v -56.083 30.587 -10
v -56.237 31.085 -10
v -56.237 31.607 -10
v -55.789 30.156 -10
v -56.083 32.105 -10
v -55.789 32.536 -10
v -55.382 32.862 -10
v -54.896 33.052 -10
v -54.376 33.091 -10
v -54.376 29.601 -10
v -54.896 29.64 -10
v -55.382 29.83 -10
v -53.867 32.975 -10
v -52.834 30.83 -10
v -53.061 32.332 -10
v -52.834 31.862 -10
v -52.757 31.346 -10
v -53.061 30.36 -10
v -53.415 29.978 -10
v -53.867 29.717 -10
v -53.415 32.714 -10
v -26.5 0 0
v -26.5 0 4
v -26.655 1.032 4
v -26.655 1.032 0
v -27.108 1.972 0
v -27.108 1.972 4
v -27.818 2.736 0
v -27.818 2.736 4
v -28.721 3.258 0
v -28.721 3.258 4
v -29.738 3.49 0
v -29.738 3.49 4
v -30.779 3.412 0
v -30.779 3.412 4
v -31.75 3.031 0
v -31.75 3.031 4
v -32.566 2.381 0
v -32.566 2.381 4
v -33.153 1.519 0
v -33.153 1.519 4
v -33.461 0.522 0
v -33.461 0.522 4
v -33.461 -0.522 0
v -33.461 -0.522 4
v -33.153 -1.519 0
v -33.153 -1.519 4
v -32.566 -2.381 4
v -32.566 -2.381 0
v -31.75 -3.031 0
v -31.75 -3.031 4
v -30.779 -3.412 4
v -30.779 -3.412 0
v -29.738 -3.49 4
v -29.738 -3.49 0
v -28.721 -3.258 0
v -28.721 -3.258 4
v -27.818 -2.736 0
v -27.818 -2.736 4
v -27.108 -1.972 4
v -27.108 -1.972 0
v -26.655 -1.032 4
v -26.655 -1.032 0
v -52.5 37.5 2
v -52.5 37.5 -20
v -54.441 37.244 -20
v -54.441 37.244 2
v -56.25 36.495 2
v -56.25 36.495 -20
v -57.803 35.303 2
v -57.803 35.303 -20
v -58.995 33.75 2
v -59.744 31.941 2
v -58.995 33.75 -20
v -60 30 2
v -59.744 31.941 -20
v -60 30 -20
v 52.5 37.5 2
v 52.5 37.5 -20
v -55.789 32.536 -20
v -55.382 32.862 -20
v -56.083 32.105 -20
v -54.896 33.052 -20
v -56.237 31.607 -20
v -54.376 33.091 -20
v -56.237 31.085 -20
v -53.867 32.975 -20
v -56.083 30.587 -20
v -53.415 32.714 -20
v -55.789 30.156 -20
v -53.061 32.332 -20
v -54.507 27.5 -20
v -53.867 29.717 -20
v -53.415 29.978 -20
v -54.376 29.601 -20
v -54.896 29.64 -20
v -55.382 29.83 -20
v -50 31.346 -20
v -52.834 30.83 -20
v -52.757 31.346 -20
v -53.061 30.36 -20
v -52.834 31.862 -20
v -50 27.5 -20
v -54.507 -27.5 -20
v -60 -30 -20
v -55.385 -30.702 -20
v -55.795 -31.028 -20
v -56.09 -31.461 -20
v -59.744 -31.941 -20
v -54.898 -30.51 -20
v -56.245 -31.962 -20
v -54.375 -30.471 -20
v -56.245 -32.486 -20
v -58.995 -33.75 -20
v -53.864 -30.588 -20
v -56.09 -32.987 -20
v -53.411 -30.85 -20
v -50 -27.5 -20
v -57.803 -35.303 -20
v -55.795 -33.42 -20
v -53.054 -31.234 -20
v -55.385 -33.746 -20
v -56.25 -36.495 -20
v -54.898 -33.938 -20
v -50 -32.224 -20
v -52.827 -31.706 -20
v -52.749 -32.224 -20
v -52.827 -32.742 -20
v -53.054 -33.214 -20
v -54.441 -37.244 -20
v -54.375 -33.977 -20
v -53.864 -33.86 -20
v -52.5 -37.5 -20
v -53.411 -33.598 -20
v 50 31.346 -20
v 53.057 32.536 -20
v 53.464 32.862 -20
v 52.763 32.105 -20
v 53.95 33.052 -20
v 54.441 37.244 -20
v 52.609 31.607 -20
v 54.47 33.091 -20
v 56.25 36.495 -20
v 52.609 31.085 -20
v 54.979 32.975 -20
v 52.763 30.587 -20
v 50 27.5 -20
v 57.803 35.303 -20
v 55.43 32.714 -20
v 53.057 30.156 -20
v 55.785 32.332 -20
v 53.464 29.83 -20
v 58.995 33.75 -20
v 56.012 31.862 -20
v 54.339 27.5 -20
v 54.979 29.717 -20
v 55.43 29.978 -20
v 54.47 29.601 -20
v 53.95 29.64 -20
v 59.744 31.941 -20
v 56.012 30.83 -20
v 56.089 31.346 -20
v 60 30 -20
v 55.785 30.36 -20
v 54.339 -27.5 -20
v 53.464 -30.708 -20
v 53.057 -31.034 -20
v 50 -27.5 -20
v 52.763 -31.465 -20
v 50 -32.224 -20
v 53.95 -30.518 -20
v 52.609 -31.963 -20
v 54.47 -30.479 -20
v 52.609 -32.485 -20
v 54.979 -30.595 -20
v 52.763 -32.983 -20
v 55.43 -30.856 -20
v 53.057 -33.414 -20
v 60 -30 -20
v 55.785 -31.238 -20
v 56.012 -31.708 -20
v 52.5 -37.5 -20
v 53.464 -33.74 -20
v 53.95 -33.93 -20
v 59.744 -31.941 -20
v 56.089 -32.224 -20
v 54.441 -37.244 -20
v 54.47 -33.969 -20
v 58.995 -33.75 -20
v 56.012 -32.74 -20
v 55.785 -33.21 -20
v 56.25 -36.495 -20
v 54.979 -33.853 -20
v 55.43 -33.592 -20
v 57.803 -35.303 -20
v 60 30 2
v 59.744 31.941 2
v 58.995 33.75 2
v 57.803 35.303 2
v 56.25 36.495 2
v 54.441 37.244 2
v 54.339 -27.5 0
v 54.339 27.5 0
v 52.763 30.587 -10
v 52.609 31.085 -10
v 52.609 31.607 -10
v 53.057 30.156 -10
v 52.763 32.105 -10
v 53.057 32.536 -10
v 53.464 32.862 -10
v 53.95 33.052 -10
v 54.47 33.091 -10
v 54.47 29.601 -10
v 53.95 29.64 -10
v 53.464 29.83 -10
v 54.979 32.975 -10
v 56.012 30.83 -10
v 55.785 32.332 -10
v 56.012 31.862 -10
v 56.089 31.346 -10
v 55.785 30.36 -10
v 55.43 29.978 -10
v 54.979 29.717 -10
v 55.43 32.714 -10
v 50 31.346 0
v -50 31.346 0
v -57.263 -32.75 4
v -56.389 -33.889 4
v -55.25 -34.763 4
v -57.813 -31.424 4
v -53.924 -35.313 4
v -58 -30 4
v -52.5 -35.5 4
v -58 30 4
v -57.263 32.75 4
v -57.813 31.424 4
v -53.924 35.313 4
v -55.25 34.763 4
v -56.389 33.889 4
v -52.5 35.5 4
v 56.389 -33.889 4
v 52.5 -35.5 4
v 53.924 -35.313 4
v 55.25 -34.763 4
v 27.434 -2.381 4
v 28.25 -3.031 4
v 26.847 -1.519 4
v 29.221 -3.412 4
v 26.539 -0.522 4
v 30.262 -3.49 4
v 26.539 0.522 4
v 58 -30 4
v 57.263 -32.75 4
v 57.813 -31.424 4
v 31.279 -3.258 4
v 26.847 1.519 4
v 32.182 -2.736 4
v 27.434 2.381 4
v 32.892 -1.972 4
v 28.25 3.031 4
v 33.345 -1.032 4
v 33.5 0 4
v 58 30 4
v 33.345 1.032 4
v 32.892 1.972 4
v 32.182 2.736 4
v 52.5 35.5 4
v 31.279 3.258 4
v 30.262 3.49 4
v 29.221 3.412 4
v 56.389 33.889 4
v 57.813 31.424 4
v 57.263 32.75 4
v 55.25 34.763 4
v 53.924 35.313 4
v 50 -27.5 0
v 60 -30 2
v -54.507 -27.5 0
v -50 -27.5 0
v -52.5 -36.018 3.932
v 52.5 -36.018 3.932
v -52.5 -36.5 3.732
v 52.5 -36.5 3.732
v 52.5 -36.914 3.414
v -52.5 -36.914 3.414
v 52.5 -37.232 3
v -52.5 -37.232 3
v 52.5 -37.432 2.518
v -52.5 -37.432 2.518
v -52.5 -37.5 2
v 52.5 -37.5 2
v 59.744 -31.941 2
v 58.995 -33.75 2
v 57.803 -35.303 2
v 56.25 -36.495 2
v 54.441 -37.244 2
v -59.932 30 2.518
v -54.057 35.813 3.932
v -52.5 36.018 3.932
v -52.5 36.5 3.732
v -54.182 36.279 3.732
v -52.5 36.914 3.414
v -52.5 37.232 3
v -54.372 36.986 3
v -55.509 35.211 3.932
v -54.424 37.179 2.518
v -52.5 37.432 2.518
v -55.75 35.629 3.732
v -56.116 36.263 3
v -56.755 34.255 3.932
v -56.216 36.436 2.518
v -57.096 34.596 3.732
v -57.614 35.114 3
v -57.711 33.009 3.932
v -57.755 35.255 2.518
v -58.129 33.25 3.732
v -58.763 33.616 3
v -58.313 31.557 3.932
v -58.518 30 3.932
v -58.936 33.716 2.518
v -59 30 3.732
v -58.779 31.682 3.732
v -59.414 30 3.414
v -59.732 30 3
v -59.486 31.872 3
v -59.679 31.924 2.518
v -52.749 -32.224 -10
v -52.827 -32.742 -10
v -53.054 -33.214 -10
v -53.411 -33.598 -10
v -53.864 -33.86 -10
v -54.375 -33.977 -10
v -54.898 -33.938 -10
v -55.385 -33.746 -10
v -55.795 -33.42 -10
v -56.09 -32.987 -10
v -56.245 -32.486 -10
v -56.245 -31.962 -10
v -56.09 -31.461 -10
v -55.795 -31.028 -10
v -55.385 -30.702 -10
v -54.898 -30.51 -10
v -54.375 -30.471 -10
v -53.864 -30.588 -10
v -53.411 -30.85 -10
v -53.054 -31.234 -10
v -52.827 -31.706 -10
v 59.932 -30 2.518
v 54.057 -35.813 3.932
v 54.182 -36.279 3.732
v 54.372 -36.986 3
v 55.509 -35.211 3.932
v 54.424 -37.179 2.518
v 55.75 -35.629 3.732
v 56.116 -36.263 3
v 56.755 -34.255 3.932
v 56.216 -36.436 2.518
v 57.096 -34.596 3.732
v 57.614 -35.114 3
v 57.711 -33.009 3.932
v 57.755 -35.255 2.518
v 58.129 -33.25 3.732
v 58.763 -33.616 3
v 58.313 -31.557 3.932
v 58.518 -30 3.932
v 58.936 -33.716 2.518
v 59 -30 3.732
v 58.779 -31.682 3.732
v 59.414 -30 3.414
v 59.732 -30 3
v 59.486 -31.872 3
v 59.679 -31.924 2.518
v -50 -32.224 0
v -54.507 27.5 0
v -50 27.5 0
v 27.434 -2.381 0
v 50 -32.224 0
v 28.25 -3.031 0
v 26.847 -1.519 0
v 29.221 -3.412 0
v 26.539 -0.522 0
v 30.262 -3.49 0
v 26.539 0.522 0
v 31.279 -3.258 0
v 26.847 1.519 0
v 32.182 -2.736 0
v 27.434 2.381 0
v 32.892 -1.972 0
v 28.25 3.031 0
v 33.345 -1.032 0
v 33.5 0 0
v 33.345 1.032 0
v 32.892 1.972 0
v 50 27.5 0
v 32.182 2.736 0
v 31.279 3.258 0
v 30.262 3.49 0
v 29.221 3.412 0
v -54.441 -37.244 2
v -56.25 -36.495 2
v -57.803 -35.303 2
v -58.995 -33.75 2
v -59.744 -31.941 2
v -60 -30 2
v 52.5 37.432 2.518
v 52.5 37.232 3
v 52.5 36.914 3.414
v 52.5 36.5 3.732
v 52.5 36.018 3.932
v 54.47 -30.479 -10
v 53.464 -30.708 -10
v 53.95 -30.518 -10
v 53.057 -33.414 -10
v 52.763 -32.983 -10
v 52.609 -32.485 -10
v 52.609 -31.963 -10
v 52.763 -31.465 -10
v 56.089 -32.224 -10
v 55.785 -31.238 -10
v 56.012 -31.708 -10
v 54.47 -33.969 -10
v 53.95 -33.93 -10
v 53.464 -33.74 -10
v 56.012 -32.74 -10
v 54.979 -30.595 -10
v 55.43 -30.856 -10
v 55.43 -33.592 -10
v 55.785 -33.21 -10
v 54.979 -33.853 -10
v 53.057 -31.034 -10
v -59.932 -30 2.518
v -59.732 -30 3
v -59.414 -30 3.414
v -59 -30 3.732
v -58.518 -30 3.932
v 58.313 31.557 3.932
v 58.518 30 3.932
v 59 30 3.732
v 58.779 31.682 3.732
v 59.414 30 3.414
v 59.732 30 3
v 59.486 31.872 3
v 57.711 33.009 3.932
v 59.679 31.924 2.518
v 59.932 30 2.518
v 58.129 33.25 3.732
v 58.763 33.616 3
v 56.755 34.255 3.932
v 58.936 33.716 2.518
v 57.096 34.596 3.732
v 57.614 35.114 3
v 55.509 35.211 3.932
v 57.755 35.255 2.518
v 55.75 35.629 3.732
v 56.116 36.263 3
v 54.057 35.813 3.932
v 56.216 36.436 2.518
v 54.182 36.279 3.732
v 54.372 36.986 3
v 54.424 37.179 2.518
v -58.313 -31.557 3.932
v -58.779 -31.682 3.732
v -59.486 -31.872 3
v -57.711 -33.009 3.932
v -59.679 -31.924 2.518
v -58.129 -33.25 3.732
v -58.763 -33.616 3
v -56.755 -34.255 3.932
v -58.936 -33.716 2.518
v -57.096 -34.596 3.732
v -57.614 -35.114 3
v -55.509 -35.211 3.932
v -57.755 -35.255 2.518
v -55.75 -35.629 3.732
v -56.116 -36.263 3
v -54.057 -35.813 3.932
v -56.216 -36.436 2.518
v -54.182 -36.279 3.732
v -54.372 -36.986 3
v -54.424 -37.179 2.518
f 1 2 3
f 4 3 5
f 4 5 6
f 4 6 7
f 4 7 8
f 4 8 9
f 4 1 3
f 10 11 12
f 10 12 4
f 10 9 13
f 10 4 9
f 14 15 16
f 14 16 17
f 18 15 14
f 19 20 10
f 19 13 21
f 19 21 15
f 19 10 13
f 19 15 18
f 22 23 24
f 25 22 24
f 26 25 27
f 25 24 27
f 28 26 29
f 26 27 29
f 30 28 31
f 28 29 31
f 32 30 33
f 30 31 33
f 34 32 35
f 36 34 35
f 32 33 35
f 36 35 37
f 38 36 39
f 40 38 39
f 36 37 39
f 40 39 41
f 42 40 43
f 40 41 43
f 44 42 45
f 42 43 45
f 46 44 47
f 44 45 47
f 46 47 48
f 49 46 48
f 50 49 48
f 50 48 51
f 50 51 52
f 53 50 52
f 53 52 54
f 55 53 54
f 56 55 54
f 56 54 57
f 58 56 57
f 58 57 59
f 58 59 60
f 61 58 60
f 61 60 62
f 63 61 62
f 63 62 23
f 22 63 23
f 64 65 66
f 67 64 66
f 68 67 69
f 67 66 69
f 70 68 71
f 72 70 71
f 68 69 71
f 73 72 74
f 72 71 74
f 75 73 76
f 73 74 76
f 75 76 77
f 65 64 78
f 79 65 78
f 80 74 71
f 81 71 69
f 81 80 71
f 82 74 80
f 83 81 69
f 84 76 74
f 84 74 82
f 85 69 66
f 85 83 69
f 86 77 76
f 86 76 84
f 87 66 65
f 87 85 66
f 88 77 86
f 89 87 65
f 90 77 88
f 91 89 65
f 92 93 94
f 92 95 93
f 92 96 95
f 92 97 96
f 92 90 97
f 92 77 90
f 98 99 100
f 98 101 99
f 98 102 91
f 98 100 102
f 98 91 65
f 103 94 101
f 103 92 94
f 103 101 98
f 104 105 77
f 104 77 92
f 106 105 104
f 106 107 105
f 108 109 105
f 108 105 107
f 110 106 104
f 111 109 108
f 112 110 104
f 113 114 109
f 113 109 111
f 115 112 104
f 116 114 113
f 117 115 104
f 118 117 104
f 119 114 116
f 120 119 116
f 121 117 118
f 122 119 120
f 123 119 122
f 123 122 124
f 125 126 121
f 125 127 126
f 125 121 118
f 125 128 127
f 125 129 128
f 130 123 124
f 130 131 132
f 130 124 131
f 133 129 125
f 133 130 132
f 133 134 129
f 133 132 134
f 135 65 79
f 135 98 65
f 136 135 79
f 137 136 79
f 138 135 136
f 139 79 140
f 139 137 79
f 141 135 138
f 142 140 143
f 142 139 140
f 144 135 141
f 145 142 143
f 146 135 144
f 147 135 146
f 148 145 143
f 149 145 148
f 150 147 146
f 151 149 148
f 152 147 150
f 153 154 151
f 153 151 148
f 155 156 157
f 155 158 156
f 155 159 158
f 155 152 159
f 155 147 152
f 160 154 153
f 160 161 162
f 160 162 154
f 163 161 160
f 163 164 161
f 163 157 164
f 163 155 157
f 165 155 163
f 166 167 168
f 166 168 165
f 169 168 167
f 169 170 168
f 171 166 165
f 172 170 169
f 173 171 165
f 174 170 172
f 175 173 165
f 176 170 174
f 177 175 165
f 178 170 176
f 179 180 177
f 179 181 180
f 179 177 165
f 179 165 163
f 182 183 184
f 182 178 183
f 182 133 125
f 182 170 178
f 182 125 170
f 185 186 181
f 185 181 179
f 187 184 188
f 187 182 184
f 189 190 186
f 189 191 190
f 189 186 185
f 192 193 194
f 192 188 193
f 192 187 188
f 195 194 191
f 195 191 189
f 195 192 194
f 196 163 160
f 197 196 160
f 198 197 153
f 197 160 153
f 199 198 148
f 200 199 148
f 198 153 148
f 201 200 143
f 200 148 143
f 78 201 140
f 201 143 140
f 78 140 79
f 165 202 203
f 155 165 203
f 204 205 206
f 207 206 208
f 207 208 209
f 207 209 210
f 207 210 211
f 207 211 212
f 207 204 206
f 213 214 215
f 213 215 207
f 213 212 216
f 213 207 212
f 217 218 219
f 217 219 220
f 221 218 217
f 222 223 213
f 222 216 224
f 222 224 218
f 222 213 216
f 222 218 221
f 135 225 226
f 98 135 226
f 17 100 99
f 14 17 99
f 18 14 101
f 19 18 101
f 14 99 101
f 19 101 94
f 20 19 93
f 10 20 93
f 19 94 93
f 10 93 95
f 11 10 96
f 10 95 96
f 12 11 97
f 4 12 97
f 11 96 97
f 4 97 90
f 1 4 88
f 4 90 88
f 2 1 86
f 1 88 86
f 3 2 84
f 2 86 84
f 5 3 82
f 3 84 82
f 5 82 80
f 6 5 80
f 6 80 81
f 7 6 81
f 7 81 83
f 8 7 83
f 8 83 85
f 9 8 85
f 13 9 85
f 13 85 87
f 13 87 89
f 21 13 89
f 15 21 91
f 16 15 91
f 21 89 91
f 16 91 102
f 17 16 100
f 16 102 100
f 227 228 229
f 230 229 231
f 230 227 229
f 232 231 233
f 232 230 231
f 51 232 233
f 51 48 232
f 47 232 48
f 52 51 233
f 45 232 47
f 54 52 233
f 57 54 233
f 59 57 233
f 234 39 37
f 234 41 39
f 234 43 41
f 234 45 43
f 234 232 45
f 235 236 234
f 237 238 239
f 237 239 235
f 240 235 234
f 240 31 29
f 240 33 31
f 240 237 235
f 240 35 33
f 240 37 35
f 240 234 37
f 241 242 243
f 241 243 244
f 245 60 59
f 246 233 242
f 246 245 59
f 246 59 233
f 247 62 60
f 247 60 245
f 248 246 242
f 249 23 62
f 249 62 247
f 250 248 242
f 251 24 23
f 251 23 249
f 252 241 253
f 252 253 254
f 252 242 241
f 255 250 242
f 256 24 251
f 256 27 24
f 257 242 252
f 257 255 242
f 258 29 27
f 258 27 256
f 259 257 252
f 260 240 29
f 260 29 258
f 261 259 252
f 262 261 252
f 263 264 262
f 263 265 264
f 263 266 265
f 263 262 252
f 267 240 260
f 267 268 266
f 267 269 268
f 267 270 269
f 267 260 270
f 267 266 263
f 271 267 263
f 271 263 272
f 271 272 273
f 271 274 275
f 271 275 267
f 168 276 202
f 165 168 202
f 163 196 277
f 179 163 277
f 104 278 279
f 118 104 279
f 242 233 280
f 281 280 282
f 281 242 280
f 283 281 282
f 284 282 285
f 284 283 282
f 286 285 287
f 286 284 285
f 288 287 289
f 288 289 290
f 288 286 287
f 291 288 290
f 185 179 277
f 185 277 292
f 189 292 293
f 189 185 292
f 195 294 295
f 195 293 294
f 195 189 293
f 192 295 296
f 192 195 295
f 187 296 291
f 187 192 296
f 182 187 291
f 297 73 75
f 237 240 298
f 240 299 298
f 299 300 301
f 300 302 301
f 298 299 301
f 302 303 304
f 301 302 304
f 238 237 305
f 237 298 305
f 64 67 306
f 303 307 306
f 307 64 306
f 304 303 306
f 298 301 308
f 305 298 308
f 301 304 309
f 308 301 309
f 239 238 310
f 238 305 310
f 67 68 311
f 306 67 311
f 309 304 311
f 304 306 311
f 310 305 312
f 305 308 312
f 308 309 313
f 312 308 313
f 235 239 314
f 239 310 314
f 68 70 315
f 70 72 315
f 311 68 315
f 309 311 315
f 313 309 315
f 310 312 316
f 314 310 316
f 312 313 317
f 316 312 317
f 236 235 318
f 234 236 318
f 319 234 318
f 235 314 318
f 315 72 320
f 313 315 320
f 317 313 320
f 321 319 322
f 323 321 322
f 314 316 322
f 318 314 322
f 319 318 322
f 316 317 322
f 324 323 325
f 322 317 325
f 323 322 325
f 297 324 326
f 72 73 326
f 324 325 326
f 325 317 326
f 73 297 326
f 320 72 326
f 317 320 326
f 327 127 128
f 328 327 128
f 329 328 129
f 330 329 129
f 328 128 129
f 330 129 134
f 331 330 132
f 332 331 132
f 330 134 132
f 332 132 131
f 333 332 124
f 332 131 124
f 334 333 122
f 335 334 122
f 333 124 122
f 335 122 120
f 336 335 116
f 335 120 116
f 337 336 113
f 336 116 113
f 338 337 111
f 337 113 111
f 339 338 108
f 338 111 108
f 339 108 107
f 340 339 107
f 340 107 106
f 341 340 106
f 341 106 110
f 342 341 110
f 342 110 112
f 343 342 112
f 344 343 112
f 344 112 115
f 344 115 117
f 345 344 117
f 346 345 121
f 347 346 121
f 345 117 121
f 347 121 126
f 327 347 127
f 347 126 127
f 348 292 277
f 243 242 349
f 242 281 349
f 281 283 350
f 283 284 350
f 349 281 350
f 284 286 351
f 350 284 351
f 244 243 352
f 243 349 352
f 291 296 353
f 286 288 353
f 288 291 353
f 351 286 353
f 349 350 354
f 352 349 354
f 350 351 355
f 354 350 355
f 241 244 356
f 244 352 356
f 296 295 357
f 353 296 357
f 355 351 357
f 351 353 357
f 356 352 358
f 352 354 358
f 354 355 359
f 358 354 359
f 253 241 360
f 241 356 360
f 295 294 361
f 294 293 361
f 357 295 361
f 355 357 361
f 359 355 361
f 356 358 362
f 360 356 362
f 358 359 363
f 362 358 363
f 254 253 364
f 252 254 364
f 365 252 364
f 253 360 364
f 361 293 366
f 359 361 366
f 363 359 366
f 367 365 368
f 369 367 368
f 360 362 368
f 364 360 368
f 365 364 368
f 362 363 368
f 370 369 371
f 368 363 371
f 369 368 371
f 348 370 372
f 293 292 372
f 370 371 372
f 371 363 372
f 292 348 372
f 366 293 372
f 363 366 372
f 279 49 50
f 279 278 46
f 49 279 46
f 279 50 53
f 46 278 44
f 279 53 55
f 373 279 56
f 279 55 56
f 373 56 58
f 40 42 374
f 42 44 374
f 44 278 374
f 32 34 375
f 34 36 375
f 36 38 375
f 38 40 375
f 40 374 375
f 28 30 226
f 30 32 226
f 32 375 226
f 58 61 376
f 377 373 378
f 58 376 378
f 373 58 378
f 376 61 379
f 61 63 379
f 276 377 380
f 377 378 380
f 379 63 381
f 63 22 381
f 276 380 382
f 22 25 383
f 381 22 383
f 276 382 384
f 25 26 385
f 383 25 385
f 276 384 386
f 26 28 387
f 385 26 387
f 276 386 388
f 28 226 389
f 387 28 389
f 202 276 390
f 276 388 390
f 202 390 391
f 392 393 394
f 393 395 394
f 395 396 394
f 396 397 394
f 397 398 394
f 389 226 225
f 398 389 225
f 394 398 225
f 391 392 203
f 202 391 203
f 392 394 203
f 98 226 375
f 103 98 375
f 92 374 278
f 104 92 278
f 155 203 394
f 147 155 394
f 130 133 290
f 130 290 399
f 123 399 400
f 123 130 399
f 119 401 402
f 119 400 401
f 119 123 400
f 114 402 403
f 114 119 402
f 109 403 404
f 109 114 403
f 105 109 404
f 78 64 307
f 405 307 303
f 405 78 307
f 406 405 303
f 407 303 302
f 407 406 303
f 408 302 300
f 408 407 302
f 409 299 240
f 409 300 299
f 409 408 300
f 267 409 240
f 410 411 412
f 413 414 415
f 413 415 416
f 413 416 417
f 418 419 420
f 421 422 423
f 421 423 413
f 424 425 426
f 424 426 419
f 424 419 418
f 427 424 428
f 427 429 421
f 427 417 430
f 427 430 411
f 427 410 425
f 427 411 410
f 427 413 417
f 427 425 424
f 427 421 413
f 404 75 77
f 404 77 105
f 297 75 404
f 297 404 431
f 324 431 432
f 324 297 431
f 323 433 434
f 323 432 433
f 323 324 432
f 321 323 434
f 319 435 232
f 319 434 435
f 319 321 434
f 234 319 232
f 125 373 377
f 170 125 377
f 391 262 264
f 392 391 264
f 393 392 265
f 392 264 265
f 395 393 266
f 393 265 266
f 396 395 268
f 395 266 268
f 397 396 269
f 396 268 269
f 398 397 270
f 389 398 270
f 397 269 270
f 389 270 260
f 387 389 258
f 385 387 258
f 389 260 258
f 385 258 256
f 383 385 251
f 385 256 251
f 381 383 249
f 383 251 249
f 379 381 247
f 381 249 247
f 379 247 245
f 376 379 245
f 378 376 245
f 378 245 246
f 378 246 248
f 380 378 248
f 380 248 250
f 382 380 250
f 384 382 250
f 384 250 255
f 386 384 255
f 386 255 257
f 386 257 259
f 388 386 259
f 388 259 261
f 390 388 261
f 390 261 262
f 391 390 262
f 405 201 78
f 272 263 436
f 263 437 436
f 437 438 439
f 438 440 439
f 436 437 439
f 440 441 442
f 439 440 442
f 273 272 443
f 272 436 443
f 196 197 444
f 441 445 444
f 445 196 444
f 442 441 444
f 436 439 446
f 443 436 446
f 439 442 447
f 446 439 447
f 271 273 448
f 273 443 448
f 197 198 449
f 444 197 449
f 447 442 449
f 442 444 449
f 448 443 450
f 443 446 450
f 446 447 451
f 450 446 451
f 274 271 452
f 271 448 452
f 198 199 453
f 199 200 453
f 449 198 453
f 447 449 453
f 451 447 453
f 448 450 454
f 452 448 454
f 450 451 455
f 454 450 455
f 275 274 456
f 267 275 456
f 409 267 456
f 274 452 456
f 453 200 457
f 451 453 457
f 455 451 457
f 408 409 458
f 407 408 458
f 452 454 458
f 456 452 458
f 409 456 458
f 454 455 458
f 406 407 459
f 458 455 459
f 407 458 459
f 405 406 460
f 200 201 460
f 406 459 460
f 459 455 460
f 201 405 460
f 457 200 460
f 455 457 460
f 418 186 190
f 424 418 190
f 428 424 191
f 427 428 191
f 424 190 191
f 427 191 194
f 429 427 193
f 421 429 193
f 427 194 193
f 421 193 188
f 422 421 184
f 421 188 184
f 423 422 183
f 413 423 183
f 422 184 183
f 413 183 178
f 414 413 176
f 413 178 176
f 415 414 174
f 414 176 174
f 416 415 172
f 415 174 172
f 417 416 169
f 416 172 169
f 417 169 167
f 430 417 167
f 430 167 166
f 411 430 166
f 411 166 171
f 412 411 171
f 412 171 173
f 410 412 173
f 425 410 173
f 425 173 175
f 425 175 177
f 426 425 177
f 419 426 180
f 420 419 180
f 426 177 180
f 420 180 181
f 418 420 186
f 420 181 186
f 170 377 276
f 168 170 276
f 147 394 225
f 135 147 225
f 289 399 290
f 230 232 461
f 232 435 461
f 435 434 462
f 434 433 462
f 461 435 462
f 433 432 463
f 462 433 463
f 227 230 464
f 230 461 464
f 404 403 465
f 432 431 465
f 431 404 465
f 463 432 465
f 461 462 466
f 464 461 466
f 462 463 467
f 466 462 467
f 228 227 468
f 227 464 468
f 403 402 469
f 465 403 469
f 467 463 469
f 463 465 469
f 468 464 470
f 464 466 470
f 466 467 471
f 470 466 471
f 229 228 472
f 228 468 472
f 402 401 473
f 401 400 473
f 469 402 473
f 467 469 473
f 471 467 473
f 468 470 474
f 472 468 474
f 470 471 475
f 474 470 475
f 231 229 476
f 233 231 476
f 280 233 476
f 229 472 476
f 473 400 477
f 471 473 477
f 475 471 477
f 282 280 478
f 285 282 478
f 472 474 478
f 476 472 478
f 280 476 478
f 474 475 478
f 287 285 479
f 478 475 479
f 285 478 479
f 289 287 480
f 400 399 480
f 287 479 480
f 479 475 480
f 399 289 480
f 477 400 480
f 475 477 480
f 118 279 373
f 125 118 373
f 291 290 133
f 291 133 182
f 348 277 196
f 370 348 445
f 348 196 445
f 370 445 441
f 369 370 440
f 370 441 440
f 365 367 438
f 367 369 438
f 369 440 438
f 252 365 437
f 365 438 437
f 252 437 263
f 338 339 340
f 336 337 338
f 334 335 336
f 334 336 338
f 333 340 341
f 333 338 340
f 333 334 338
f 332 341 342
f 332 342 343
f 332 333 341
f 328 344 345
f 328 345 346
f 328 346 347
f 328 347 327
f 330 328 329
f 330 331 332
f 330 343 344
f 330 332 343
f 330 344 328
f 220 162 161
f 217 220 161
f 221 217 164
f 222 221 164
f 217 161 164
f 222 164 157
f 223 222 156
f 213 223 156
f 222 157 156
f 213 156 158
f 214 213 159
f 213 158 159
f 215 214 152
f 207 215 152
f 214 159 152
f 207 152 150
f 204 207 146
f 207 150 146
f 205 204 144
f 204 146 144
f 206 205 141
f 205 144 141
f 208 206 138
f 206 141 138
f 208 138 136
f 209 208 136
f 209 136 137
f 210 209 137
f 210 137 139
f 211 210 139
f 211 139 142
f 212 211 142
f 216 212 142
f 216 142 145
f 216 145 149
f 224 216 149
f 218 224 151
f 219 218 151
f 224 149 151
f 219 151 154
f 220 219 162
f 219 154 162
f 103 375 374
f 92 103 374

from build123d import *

# Parameters (mm, degrees)
F0_W         = 120
F0_H         = 75
F1_DEPTH     = 4
F2_W         = 120
F2_H         = 75
F3_DEPTH     = 20
F4_R         = 2
F5_T1_DEPTH  = 42.75
F5_T4_ANGLE  = 90
F5_T6_ANGLE  = 90
F5_T8_ANGLE  = 90
F5_T10_ANGLE = 90
F6_R         = 3.5
F7_DEPTH     = 25
F8_R         = 1.7577503979
F8_R_2       = 1.75
F9_DEPTH     = 10


# Not quite as in the source:
# - a fillet or chamfer that OpenCascade refuses, or shapes differently, is made with other operations: its cross-section is extruded or revolved along the edge and cut away or added


with BuildPart() as f1:
    # F0 (on Top) → F1 (new body)
    with BuildSketch(Plane.XY):
        Rectangle(F0_W, F0_H)
    extrude(amount=F1_DEPTH)

    # F2 (on face) → F3 (join)
    with BuildSketch(Plane(origin=(0, 0, 0), x_dir=(1, 0, 0), z_dir=(0, 0, -1))):
        Rectangle(F2_W, F2_H)
        Polygon((54.339364171, -27.5), (50, -27.5), (50, -31.3459709287), (-50, -31.3459709287), (-50, -27.5), (-54.5065030456, -27.5), (-54.5065030456, 27.5), (-50, 27.5), (-50, 32.2239883244), (50, 32.2239883244), (50, 27.5), (54.339364171, 27.5), align=None, mode=Mode.SUBTRACT)
    extrude(amount=F3_DEPTH)

    # F4
    f4_edges = [f1.edges().sort_by_distance(p)[0] for p in [
        (60, 0, 4),
        (0, -37.5, 4),
        (-60, 0, 4),
        (0, 37.5, 4),
    ]]
    fillet(f4_edges, radius=F4_R)

    # F5: fillet of radius 7.5 on 4 edges, made by hand

    # F5_s2 → F5_t1 (cut)
    with BuildSketch(Plane.XY.offset(-38.75)):
        with BuildLine():
            ThreePointArc((60, -30), (57.8033008589, -35.3033008589), (52.5, -37.5))
            Line((52.5, -37.5), (60, -37.5))
            Line((60, -37.5), (60, -30))
        make_face()
        with BuildLine():
            ThreePointArc((60, 30), (57.8033008589, 35.3033008589), (52.5, 37.5))
            Line((52.5, 37.5), (60, 37.5))
            Line((60, 37.5), (60, 30))
        make_face()
        with BuildLine():
            ThreePointArc((-52.5, -37.5), (-57.8033008589, -35.3033008589), (-60, -30))
            Line((-60, -30), (-60, -37.5))
            Line((-60, -37.5), (-52.5, -37.5))
        make_face()
        with BuildLine():
            ThreePointArc((-52.5, 37.5), (-57.8033008589, 35.3033008589), (-60, 30))
            Line((-60, 30), (-60, 37.5))
            Line((-60, 37.5), (-52.5, 37.5))
        make_face()
    extrude(amount=F5_T1_DEPTH, mode=Mode.SUBTRACT)

    # F5_s3 → F5_t4 (revolve, cut)
    with BuildSketch(Plane.YZ.offset(-52.5)):
        with BuildLine():
            ThreePointArc((35.5, 4), (36.9142135624, 3.4142135624), (37.5, 2))
            Line((37.5, 2), (37.5, 4))
            Line((37.5, 4), (35.5, 4))
        make_face()
    revolve(axis=Axis((-52.5, 30, 4), (0, 0, 1)), revolution_arc=F5_T4_ANGLE, mode=Mode.SUBTRACT)

    # F5_s5 → F5_t6 (revolve, cut)
    with BuildSketch(Plane.XZ.offset(30)):
        with BuildLine():
            ThreePointArc((-58, 4), (-59.4142135624, 3.4142135624), (-60, 2))
            Line((-60, 2), (-60, 4))
            Line((-60, 4), (-58, 4))
        make_face()
    revolve(axis=Axis((-52.5, -30, 4), (0, 0, 1)), revolution_arc=F5_T6_ANGLE, mode=Mode.SUBTRACT)

    # F5_s7 → F5_t8 (revolve, cut)
    with BuildSketch(Plane.XZ.offset(-30)):
        with BuildLine():
            ThreePointArc((58, 4), (59.4142135624, 3.4142135624), (60, 2))
            Line((60, 2), (60, 4))
            Line((60, 4), (58, 4))
        make_face()
    revolve(axis=Axis((52.5, 30, 4), (0, 0, 1)), revolution_arc=F5_T8_ANGLE, mode=Mode.SUBTRACT)

    # F5_s9 → F5_t10 (revolve, cut)
    with BuildSketch(Plane.YZ.offset(52.5)):
        with BuildLine():
            ThreePointArc((-35.5, 4), (-36.9142135624, 3.4142135624), (-37.5, 2))
            Line((-37.5, 2), (-37.5, 4))
            Line((-37.5, 4), (-35.5, 4))
        make_face()
    revolve(axis=Axis((52.5, -30, 4), (0, 0, 1)), revolution_arc=F5_T10_ANGLE, mode=Mode.SUBTRACT)

    # F6 (on face) → F7 (cut)
    with BuildSketch(Plane.XY.offset(4)):
        with Locations((-30, 0)):
            Circle(F6_R)
        with Locations((30, 0)):
            Circle(F6_R)
    extrude(amount=-F7_DEPTH, mode=Mode.SUBTRACT)

    # F8 (on face) → F9 (cut)
    with BuildSketch(Plane(origin=(0, 0, -20), x_dir=(1, 0, 0), z_dir=(0, 0, -1))):
        with Locations((-54.5065030456, 32.2239883244)):
            Circle(F8_R)
        with Locations((54.339364171, 32.2239883244)):
            Circle(F8_R_2)
        with Locations((54.339364171, -31.3459709287)):
            Circle(F8_R_2)
        with Locations((-54.5065030456, -31.3459709287)):
            Circle(F8_R_2)
    extrude(amount=-F9_DEPTH, mode=Mode.SUBTRACT)


solid = f1.part
